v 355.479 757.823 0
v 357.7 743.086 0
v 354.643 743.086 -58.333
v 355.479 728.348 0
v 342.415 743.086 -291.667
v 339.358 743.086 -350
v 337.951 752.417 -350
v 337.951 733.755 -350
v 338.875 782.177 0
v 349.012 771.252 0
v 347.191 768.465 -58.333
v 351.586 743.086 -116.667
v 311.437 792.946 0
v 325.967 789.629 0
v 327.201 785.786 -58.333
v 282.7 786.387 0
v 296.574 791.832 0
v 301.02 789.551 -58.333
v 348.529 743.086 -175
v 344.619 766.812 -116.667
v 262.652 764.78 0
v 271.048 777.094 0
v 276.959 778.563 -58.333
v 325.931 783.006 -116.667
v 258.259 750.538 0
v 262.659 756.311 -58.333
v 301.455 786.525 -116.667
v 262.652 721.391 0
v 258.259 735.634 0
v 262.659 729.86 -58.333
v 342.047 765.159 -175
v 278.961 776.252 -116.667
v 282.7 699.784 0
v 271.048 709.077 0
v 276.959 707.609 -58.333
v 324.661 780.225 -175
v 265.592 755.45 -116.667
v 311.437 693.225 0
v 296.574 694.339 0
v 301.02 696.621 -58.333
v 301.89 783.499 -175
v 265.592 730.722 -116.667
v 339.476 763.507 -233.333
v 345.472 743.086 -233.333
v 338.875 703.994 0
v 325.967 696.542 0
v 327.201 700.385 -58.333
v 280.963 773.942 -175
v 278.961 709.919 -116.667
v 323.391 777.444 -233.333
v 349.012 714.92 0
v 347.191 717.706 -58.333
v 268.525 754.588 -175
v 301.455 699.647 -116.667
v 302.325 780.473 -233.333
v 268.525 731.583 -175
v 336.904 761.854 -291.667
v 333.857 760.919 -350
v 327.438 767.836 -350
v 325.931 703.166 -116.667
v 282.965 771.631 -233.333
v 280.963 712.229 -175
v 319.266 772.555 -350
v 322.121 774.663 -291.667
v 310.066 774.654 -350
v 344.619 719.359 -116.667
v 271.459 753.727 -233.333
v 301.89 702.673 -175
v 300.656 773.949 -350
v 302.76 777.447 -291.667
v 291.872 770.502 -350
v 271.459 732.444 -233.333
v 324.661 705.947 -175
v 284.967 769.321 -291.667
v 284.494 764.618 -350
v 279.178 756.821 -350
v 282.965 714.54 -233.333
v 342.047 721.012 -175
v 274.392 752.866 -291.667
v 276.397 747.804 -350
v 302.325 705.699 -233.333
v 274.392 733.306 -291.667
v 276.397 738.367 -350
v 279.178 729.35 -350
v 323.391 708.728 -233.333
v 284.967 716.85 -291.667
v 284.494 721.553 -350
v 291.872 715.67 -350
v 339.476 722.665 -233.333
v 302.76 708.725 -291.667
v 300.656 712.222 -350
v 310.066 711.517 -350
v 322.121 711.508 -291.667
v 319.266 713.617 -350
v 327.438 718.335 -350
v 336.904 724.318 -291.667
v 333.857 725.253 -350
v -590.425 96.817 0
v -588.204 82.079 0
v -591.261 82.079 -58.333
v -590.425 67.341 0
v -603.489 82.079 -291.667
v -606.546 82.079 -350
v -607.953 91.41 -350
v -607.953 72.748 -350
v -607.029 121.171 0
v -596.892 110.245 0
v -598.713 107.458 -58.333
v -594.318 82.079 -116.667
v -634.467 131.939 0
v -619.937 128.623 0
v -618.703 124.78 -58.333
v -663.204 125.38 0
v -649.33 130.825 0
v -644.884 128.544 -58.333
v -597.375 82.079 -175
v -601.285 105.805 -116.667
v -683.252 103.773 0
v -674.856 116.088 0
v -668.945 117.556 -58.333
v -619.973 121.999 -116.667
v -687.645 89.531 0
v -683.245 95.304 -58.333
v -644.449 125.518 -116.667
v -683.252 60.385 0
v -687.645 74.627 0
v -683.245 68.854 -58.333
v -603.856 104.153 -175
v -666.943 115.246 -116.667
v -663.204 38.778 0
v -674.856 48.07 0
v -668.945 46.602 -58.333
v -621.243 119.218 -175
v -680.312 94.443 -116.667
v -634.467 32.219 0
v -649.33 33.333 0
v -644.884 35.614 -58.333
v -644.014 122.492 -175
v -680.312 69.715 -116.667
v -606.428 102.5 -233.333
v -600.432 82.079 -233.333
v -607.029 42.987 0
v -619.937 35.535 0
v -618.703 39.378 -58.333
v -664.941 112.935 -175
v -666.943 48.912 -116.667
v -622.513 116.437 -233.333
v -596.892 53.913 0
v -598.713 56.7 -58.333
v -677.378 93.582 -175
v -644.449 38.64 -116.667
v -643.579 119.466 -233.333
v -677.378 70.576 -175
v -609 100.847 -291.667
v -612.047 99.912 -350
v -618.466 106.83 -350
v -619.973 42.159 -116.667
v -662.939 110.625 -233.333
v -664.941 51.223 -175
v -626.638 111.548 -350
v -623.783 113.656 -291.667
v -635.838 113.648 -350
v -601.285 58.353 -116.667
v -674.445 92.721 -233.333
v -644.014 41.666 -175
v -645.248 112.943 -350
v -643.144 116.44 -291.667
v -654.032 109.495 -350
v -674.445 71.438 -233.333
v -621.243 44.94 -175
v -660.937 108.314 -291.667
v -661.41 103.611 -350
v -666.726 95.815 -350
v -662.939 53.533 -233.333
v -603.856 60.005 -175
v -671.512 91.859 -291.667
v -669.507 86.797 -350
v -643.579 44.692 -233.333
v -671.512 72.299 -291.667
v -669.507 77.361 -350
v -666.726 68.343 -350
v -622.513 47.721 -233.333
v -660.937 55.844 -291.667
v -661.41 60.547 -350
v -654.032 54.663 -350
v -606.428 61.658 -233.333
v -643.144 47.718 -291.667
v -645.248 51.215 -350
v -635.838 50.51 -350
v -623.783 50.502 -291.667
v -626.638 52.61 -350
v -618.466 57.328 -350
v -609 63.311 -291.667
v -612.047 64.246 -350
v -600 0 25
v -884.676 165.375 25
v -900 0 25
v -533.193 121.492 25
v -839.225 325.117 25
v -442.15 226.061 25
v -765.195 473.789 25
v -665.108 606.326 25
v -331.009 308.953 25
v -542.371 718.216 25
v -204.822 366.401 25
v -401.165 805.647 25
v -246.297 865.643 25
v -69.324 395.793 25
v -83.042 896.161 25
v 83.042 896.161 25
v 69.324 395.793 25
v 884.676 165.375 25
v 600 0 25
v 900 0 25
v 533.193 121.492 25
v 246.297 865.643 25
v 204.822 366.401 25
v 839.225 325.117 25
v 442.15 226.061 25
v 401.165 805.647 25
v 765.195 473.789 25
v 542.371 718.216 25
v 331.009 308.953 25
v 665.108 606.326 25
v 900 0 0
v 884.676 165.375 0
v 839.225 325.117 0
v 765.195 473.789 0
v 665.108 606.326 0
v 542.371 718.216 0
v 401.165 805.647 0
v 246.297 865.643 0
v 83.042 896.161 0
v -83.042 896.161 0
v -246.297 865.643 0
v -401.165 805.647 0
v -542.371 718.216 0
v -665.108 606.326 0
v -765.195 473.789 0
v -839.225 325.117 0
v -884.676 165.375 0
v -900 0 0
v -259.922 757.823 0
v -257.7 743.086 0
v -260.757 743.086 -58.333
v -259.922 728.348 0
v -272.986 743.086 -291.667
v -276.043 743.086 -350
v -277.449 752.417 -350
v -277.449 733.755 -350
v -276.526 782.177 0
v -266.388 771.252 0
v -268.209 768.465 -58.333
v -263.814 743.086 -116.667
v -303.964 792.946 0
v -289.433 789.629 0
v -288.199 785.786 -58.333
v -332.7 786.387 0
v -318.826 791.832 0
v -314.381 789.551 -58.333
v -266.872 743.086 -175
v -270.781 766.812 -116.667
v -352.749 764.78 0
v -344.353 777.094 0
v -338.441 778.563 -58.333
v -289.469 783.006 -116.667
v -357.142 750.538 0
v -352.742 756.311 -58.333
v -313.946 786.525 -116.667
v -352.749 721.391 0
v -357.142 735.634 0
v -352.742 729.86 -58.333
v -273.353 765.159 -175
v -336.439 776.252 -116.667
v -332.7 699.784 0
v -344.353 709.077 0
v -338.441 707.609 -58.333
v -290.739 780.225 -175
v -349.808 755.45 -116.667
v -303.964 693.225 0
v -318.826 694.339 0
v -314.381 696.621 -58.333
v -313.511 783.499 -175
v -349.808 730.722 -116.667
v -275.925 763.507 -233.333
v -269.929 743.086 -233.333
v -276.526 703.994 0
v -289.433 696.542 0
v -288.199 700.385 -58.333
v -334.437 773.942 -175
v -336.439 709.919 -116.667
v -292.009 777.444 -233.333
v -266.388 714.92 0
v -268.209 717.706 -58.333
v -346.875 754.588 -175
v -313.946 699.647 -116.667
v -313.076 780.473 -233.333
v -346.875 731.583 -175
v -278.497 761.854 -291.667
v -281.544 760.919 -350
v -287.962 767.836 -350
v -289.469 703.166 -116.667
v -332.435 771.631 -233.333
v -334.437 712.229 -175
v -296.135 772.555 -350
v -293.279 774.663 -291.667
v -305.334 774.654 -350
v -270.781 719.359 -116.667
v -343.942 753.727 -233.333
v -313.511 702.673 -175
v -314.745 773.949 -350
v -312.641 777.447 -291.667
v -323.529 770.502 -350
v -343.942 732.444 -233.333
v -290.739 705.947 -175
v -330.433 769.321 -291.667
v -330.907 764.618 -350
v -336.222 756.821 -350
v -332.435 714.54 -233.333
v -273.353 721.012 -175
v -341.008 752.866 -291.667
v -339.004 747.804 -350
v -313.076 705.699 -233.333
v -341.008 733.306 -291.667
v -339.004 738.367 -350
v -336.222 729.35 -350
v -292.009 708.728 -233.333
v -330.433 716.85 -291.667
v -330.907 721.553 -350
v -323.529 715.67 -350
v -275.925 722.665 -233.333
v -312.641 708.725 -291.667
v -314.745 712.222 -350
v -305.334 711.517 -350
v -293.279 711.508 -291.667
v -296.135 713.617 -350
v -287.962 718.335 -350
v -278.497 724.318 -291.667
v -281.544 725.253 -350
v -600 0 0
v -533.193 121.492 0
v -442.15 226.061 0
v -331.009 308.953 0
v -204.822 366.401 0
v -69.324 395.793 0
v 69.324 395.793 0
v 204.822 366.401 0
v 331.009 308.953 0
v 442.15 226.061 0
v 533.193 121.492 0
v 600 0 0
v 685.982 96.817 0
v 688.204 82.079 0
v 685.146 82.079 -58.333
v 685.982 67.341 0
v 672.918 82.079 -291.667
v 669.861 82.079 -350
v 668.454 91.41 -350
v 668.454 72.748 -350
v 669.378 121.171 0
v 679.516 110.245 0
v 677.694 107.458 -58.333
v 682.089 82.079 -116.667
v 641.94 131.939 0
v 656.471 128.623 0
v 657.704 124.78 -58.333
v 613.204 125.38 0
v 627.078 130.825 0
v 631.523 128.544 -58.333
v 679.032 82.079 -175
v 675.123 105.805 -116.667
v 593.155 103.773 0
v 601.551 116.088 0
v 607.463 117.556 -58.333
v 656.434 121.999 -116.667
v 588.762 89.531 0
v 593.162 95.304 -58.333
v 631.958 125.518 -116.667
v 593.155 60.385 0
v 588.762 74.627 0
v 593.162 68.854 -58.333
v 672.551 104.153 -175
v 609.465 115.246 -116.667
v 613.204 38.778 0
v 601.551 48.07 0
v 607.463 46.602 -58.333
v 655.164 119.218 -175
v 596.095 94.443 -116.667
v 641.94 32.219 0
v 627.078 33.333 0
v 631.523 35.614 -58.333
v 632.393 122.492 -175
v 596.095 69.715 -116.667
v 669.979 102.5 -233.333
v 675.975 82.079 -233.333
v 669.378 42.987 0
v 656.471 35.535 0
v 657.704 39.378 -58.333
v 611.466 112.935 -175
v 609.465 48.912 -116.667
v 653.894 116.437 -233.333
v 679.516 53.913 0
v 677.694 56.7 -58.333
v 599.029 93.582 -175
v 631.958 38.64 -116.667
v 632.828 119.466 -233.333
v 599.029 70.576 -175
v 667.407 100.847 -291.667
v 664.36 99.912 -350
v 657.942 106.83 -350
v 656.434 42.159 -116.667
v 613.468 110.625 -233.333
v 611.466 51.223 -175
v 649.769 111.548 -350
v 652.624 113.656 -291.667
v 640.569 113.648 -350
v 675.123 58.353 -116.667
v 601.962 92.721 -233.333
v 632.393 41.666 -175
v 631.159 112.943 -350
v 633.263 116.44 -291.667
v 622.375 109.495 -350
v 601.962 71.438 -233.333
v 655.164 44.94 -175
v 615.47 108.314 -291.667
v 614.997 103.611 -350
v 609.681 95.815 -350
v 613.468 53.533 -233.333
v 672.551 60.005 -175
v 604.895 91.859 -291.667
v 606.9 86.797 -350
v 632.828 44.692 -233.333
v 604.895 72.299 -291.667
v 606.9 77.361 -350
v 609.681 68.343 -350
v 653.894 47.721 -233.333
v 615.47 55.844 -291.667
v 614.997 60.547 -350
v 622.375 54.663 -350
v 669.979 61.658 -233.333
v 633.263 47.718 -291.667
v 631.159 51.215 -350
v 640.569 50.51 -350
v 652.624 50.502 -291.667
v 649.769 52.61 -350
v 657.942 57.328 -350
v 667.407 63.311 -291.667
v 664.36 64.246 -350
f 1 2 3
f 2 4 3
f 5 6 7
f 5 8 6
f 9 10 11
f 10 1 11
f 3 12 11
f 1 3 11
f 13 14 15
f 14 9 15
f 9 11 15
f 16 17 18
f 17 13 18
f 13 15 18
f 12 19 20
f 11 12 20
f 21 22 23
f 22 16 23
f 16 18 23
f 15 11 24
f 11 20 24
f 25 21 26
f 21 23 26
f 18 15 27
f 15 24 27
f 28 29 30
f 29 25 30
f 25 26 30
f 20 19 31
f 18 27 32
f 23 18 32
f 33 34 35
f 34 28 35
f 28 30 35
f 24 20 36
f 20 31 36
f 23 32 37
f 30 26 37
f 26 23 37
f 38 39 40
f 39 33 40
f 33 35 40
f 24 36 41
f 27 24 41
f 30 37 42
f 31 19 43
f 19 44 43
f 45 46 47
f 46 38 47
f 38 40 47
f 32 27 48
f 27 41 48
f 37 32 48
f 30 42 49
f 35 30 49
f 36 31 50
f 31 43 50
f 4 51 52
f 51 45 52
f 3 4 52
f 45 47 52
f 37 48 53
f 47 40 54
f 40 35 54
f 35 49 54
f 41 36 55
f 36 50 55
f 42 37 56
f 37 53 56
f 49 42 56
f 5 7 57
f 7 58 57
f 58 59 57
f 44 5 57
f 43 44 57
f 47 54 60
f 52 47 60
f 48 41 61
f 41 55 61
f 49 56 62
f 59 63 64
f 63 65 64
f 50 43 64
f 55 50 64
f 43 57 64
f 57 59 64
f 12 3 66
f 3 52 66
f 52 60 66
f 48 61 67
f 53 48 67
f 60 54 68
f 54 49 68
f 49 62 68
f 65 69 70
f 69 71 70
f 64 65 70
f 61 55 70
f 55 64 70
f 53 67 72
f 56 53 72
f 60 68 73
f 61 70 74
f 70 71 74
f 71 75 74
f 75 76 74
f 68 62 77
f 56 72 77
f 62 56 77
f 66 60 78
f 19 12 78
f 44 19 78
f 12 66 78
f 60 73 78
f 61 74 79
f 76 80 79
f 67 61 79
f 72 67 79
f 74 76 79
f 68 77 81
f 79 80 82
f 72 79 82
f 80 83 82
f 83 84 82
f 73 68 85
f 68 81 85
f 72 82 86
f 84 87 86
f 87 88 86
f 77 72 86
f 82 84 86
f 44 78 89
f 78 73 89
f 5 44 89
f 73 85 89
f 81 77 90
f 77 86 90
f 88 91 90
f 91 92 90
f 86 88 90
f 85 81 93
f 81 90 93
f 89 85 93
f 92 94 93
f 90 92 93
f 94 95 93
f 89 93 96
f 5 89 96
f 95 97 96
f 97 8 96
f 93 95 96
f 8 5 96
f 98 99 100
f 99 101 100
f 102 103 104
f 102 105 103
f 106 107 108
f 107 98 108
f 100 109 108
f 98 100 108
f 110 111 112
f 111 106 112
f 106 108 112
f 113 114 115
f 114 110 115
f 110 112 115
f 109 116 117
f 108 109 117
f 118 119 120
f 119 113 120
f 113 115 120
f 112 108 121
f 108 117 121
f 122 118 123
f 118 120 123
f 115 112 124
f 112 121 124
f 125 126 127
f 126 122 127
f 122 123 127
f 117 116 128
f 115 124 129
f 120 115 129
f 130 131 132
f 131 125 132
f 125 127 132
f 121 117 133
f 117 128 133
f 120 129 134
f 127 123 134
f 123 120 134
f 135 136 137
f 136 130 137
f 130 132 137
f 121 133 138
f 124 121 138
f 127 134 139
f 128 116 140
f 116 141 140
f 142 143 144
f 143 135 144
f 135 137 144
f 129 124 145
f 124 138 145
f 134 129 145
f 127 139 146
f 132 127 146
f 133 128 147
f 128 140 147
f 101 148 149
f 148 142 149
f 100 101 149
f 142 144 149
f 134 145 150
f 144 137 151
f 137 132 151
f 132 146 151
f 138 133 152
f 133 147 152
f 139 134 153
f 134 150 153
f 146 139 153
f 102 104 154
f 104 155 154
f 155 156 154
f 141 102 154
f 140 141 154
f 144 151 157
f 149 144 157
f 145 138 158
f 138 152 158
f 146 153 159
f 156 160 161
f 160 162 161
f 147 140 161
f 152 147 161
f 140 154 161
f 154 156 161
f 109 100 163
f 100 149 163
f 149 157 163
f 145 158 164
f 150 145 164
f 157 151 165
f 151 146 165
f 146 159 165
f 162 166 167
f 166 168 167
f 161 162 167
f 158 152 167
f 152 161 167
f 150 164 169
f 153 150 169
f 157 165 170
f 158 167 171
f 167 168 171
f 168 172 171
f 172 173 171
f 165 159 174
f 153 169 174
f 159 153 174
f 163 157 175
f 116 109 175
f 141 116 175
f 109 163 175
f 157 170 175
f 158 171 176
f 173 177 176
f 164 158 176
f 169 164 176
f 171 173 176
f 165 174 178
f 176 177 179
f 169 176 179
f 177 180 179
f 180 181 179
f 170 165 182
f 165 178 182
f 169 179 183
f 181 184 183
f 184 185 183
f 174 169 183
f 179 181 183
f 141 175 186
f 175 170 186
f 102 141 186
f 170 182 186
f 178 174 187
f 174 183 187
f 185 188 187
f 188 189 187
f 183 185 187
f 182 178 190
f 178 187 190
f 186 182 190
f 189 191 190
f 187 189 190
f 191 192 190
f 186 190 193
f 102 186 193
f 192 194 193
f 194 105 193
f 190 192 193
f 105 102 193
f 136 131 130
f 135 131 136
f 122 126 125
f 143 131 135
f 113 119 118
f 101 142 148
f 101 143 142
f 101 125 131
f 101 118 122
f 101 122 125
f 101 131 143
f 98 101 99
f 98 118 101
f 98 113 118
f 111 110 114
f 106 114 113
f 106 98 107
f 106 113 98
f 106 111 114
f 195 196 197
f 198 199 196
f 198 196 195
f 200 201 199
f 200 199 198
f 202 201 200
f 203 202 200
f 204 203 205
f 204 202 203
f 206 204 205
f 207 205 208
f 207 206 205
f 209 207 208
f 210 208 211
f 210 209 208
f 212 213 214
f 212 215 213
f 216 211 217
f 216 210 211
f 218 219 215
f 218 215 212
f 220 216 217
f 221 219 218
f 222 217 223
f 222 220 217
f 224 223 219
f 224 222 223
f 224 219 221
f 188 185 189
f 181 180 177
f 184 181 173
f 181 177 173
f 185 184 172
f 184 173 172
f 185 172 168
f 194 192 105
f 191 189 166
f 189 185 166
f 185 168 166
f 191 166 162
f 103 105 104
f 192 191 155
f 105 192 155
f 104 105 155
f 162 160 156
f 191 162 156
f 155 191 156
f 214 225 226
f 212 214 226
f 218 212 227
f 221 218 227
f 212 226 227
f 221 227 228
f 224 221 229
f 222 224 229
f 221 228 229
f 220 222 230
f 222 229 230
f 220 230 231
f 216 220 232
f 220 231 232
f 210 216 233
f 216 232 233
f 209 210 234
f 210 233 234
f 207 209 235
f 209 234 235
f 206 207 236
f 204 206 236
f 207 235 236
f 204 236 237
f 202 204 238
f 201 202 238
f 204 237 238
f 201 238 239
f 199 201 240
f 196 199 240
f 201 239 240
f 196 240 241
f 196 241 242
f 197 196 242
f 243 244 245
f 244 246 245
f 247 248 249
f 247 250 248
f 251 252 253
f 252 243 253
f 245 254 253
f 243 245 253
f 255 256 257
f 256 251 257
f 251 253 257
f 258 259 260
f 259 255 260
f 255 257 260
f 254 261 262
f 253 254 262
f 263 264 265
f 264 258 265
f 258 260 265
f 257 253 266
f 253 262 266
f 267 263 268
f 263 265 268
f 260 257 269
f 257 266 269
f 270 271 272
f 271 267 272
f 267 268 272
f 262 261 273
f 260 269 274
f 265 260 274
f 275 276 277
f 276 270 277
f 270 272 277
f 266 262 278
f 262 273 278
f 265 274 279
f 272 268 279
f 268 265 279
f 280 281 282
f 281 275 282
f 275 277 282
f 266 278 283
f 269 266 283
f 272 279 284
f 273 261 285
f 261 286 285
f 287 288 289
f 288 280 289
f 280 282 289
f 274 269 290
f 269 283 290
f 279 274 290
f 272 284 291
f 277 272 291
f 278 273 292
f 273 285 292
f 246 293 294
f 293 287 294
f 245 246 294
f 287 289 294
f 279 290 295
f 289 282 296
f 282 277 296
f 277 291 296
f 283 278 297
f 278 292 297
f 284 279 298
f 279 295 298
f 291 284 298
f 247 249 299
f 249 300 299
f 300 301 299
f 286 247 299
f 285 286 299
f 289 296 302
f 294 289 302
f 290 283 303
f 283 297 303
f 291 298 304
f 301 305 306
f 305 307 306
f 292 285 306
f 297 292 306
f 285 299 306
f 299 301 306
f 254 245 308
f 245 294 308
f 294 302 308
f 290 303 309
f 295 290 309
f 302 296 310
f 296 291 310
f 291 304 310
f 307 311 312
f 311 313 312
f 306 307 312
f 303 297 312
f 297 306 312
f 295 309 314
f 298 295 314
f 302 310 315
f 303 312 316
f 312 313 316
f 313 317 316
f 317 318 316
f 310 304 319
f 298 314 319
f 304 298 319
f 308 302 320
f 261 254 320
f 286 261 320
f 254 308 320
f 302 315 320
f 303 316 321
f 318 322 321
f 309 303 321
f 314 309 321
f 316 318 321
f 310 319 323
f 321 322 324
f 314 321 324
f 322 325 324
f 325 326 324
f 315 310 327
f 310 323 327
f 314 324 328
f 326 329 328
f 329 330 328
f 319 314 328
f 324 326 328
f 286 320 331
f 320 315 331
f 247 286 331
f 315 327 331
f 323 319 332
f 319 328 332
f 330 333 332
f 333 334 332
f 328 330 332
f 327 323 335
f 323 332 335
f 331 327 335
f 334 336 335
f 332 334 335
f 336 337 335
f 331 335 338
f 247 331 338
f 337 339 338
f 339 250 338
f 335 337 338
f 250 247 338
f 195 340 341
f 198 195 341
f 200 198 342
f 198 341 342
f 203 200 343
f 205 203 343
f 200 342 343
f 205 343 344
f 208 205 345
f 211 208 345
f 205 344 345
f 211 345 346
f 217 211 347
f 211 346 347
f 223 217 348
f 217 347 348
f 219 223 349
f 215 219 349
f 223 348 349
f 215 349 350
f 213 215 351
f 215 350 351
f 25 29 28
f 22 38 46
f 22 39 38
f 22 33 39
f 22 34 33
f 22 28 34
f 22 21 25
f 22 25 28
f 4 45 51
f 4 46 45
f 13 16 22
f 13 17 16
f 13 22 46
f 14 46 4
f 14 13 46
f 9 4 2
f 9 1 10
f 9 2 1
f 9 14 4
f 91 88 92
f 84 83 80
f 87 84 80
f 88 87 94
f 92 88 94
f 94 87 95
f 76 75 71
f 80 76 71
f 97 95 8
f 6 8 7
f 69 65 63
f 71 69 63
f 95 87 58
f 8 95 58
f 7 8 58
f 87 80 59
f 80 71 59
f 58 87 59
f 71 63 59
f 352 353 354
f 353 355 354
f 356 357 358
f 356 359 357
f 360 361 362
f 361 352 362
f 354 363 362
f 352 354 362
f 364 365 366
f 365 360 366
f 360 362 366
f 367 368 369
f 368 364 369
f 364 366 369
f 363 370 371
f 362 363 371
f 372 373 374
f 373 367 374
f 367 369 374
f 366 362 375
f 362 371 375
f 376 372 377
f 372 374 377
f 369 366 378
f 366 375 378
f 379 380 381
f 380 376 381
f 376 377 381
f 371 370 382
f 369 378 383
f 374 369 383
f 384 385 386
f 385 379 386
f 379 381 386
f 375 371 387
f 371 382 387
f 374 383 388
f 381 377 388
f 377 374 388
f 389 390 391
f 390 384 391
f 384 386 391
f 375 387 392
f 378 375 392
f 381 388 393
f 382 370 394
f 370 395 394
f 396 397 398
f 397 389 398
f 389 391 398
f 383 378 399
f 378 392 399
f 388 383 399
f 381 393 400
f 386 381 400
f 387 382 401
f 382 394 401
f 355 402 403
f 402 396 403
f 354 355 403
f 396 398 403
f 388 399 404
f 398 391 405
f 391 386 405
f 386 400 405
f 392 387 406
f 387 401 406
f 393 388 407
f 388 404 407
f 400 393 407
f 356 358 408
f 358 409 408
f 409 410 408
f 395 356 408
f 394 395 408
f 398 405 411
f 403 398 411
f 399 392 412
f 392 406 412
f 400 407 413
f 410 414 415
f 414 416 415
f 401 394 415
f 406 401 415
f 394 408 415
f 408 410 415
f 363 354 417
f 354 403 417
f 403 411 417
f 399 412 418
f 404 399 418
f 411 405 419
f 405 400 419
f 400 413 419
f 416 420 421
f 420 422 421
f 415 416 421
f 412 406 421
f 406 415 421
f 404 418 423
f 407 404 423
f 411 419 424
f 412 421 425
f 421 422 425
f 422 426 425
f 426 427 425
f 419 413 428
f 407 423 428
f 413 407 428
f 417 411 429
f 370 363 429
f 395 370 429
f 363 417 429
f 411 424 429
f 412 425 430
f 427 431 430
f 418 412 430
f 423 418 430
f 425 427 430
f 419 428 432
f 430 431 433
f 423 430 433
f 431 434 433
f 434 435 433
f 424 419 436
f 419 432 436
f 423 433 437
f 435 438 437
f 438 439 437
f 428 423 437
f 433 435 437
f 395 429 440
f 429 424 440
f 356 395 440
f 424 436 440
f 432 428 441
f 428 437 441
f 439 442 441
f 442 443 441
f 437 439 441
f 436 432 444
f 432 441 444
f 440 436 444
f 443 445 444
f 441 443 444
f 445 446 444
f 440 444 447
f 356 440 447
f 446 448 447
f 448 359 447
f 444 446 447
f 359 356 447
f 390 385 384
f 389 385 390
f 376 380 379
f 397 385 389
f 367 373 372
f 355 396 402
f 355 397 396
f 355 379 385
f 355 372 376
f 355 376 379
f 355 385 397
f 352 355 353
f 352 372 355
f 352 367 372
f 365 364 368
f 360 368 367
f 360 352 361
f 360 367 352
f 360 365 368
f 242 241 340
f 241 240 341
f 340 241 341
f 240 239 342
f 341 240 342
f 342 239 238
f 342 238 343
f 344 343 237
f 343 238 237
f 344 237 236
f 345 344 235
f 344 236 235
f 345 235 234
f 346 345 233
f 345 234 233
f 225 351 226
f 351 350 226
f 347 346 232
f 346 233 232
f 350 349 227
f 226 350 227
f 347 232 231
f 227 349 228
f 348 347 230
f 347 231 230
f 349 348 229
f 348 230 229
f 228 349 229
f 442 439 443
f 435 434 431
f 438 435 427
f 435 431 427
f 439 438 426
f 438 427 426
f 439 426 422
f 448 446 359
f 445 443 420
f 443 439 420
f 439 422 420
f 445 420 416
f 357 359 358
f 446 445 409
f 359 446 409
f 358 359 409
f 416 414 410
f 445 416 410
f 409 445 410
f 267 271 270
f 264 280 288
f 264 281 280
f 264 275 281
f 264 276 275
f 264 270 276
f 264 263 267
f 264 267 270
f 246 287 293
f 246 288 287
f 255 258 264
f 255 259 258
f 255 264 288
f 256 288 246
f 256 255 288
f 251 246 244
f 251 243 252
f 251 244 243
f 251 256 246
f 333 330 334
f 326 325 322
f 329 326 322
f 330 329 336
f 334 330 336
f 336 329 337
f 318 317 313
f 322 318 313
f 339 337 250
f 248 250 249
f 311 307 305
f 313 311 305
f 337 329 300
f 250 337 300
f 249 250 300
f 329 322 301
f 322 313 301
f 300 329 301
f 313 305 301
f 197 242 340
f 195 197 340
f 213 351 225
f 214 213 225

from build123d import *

# Parameters (mm, degrees)
F0_R     = 50
F1_DEPTH = 25
F2_DEPTH = 350
F2_TAPER = 3


with BuildPart() as f1:
    # F0 (on Top) → F1 (new body)
    with BuildSketch(Plane.XY):
        with BuildLine():
            Line((600, 0), (900, 0))
            ThreePointArc((900, 0), (0, 900), (-900, 0))
            Line((-900, 0), (-600, 0))
            ThreePointArc((-600, 0), (0, 399.4984909986), (600, 0))
        make_face()
        with Locations((-638.203561306, 82.0790380239)):
            Circle(F0_R, mode=Mode.SUBTRACT)
        with Locations((-307.7002465725, 743.0856823921)):
            Circle(F0_R, mode=Mode.SUBTRACT)
        with Locations((638.203561306, 82.0790380239)):
            Circle(F0_R, mode=Mode.SUBTRACT)
        with Locations((307.7002465725, 743.0856823921)):
            Circle(F0_R, mode=Mode.SUBTRACT)
        with Locations((-638.203561306, 82.0790380239)):
            Circle(F0_R)
        with Locations((-307.7002465725, 743.0856823921)):
            Circle(F0_R)
        with Locations((307.7002465725, 743.0856823921)):
            Circle(F0_R)
        with Locations((638.203561306, 82.0790380239)):
            Circle(F0_R)
    extrude(amount=F1_DEPTH)


with BuildPart() as f2:
    # F0 (on Top) → F2 (new body)
    with BuildSketch(Plane.XY):
        with Locations((-638.203561306, 82.0790380239)):
            Circle(F0_R)
    extrude(amount=-F2_DEPTH, taper=F2_TAPER)


with BuildPart() as f2b:
    # F0 (on Top) → F2, piece 2 (new body)
    with BuildSketch(Plane.XY):
        with Locations((-307.7002465725, 743.0856823921)):
            Circle(F0_R)
    extrude(amount=-F2_DEPTH, taper=F2_TAPER)


with BuildPart() as f2c:
    # F0 (on Top) → F2, piece 3 (new body)
    with BuildSketch(Plane.XY):
        with Locations((307.7002465725, 743.0856823921)):
            Circle(F0_R)
    extrude(amount=-F2_DEPTH, taper=F2_TAPER)


with BuildPart() as f2d:
    # F0 (on Top) → F2, piece 4 (new body)
    with BuildSketch(Plane.XY):
        with Locations((638.203561306, 82.0790380239)):
            Circle(F0_R)
    extrude(amount=-F2_DEPTH, taper=F2_TAPER)


solid = Compound([f1.part, f2.part, f2b.part, f2c.part, f2d.part])
